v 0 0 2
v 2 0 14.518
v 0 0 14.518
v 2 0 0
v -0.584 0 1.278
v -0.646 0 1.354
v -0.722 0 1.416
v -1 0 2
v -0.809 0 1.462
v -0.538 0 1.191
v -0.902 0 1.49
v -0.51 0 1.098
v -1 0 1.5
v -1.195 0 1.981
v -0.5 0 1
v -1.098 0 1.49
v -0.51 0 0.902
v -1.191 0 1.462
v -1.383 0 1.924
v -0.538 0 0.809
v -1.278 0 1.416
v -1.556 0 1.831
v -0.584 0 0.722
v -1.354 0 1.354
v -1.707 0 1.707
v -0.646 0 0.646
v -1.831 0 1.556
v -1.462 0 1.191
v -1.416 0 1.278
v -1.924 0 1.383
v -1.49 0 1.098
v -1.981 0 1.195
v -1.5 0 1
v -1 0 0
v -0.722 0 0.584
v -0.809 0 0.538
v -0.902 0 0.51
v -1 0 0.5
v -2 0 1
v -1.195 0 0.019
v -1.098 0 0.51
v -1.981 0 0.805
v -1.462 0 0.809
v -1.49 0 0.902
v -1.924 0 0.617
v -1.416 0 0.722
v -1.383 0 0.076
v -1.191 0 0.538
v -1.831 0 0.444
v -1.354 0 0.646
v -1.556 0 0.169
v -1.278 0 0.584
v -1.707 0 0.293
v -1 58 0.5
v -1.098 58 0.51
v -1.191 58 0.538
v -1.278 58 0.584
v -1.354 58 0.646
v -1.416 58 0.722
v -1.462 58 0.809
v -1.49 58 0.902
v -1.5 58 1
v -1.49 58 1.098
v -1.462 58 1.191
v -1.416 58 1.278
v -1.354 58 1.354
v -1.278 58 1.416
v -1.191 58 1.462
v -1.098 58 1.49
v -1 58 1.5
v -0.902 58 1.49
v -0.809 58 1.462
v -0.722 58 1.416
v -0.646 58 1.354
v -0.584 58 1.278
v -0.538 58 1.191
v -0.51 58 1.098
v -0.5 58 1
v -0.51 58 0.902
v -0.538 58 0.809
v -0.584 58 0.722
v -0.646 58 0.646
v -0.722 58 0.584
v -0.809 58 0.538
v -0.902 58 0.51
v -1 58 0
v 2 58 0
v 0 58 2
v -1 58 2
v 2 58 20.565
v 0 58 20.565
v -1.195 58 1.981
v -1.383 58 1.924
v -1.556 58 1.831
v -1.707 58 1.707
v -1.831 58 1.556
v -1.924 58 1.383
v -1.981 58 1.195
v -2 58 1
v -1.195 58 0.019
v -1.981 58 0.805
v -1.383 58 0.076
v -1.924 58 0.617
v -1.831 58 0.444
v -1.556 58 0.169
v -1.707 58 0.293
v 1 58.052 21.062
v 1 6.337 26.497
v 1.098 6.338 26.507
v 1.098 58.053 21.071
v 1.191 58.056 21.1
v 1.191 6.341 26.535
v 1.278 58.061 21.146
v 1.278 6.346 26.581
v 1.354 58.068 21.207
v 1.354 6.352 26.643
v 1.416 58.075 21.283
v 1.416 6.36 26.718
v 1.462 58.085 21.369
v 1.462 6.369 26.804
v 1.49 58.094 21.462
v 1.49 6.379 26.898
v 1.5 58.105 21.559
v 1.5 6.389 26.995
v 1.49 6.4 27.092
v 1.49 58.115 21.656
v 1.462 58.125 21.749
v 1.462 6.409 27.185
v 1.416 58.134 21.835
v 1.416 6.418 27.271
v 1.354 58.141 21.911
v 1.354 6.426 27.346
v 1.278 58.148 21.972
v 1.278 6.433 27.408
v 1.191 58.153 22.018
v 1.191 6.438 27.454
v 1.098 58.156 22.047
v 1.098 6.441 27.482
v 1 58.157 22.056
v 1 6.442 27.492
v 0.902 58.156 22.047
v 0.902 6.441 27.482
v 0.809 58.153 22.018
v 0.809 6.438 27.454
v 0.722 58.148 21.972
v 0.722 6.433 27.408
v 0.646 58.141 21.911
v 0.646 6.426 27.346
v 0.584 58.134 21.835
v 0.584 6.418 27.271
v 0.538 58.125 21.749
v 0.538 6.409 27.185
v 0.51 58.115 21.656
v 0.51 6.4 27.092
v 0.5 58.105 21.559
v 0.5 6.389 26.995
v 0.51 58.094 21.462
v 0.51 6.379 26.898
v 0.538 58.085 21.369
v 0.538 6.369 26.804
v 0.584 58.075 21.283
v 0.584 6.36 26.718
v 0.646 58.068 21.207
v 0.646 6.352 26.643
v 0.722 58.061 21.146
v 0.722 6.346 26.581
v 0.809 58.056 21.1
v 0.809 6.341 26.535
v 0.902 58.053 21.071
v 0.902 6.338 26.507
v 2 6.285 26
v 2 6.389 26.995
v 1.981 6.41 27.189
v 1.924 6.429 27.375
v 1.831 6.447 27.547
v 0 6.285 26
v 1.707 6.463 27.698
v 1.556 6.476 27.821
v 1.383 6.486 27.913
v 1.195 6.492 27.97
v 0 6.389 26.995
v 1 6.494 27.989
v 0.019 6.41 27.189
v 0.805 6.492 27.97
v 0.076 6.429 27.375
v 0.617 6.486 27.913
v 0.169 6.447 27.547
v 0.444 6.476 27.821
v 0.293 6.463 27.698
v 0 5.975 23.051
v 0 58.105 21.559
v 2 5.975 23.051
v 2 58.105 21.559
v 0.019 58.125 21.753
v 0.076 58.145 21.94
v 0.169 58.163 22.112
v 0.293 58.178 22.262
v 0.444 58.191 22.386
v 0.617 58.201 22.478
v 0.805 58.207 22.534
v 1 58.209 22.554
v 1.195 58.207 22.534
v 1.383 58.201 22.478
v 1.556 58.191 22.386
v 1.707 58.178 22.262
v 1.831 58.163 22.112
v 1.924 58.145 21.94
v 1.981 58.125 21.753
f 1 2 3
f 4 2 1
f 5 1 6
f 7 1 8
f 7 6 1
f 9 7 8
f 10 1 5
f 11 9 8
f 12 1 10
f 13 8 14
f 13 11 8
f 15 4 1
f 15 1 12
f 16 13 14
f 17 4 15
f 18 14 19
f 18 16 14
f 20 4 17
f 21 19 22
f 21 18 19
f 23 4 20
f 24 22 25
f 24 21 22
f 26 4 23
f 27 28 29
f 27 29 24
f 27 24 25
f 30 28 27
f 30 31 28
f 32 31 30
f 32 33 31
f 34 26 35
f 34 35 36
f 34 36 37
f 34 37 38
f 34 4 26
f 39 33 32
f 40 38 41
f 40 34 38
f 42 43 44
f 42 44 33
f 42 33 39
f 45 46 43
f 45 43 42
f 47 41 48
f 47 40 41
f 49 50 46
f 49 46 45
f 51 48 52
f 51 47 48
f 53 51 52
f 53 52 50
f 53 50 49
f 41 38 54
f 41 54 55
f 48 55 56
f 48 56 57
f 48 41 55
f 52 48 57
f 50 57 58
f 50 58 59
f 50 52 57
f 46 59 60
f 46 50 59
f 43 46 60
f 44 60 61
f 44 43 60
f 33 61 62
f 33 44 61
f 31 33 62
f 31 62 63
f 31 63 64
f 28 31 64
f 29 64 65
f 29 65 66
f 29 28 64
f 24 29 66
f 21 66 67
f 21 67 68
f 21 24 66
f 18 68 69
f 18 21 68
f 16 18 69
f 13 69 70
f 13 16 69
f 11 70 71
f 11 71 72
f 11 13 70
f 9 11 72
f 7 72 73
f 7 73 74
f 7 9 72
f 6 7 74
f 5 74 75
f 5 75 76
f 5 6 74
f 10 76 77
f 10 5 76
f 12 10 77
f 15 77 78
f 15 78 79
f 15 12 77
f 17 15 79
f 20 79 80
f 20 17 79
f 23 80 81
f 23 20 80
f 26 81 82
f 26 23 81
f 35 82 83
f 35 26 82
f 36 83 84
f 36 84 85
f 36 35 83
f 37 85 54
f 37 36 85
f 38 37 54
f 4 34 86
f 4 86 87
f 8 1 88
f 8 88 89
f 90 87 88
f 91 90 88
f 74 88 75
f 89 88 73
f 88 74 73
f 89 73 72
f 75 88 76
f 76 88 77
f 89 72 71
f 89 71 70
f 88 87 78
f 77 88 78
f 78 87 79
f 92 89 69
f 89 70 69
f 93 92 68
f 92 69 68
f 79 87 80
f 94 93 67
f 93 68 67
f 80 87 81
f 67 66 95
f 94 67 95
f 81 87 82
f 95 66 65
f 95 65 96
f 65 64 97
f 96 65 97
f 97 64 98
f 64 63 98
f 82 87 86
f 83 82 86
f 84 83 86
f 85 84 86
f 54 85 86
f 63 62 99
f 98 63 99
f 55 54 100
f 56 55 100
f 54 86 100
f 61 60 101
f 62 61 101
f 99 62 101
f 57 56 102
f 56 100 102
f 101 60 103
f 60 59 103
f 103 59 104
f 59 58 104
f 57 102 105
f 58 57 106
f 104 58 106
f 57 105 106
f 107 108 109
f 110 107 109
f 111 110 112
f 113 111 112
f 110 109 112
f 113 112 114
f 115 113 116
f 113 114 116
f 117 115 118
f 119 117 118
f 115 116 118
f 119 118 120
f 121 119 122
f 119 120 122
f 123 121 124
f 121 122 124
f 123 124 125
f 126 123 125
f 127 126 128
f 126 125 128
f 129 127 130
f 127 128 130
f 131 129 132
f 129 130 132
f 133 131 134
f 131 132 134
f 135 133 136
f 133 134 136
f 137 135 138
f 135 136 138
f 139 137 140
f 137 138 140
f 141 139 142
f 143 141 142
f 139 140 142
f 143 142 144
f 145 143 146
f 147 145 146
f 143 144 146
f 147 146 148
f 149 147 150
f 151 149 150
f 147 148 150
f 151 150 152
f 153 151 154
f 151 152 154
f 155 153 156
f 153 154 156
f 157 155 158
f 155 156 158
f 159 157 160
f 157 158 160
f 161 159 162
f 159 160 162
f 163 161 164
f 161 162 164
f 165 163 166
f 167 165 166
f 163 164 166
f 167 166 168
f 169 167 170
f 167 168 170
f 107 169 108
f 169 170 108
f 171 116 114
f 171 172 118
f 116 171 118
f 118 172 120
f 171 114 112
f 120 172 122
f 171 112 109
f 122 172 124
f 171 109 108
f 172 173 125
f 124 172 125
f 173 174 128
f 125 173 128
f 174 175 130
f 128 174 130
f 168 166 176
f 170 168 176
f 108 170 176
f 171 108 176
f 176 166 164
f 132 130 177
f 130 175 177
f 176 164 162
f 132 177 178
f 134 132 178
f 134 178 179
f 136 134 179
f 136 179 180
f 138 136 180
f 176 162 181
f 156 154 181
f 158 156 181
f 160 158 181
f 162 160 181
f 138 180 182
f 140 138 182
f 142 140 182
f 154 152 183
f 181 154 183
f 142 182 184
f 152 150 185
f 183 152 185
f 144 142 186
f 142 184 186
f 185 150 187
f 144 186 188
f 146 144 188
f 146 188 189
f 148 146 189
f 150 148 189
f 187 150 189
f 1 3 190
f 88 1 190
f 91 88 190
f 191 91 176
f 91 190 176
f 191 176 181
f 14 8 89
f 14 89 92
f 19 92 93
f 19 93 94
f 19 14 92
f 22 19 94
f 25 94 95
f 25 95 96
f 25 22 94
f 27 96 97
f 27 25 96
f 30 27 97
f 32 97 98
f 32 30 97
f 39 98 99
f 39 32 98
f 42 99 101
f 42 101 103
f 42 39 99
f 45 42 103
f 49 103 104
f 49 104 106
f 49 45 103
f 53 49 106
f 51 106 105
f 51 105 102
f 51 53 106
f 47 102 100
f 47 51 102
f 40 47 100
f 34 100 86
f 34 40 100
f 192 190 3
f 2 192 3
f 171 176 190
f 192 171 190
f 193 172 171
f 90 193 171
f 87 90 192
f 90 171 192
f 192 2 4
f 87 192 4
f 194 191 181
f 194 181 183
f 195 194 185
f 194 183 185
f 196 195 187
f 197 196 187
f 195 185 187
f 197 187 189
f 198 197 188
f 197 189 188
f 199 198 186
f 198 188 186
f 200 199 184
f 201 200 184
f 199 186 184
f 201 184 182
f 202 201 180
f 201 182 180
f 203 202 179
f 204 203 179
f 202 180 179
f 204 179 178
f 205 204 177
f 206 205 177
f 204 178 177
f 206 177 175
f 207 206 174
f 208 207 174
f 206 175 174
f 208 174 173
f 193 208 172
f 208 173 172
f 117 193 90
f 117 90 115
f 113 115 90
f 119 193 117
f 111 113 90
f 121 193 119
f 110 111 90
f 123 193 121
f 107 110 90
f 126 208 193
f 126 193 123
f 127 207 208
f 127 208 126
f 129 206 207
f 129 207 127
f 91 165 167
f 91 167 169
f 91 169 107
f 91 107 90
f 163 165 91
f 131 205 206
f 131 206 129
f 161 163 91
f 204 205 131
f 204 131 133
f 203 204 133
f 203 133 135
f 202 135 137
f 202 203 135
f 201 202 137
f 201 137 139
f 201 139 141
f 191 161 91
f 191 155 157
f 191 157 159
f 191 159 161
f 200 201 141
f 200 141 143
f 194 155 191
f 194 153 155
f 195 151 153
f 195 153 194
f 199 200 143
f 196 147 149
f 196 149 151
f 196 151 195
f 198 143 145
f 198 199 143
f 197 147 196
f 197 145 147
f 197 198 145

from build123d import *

# Parameters (mm, degrees)
EXTRUDE_1_DEPTH = 2
SKETCH_3_R      = 0.5
EXTRUDE_3_DEPTH = 52
SKETCH_4_R      = 0.5
EXTRUDE_4_DEPTH = 58


with BuildPart() as part:
    # Эскиз1 → Бобышка-Вытянуть1 (new body)
    with BuildSketch(Plane(origin=(0, 0, 0), x_dir=(0, 0, -1), z_dir=(1, 0, 0))):
        Polygon((-26, 6.284861441), (-23.051215157, 5.974931665), (-14.51812841, 0), (0, 0), (0, 58), (-20.56451991, 58), align=None)
    extrude(amount=EXTRUDE_1_DEPTH)

    # Эскиз3 → Бобышка-Вытянуть3 (add)
    with BuildSketch(Plane(origin=(0, 3.513339809, -0.369266894), x_dir=(1, 0, 0), z_dir=(0, -0.9945218953682733, 0.10452846326765391))):
        with BuildLine():
            Line((0, 26.514516188), (0, 27.514516188))
            ThreePointArc((0, 27.514516188), (1, 28.514516188), (2, 27.514516188))
            Line((2, 27.514516188), (2, 26.514516188))
            Line((2, 26.514516188), (0, 26.514516188))
        make_face()
        with Locations(Location((1, 27.514516188, 0), (0, 0, 270))):
            Circle(SKETCH_3_R, mode=Mode.SUBTRACT)
    extrude(amount=-EXTRUDE_3_DEPTH)

    # Эскиз4 → Бобышка-Вытянуть4 (add)
    with BuildSketch(Plane(origin=(0, 0, 0), x_dir=(1, 0, 0), z_dir=(0, 1, 0))):
        with BuildLine():
            Line((-1, 0), (0, 0))
            Line((0, 0), (0, -2))
            Line((0, -2), (-1, -2))
            ThreePointArc((-1, -2), (-2, -1), (-1, 0))
        make_face()
        with Locations(Location((-1, -1, 0), (0, 0, 90))):
            Circle(SKETCH_4_R, mode=Mode.SUBTRACT)
    extrude(amount=EXTRUDE_4_DEPTH)


solid = part.part
